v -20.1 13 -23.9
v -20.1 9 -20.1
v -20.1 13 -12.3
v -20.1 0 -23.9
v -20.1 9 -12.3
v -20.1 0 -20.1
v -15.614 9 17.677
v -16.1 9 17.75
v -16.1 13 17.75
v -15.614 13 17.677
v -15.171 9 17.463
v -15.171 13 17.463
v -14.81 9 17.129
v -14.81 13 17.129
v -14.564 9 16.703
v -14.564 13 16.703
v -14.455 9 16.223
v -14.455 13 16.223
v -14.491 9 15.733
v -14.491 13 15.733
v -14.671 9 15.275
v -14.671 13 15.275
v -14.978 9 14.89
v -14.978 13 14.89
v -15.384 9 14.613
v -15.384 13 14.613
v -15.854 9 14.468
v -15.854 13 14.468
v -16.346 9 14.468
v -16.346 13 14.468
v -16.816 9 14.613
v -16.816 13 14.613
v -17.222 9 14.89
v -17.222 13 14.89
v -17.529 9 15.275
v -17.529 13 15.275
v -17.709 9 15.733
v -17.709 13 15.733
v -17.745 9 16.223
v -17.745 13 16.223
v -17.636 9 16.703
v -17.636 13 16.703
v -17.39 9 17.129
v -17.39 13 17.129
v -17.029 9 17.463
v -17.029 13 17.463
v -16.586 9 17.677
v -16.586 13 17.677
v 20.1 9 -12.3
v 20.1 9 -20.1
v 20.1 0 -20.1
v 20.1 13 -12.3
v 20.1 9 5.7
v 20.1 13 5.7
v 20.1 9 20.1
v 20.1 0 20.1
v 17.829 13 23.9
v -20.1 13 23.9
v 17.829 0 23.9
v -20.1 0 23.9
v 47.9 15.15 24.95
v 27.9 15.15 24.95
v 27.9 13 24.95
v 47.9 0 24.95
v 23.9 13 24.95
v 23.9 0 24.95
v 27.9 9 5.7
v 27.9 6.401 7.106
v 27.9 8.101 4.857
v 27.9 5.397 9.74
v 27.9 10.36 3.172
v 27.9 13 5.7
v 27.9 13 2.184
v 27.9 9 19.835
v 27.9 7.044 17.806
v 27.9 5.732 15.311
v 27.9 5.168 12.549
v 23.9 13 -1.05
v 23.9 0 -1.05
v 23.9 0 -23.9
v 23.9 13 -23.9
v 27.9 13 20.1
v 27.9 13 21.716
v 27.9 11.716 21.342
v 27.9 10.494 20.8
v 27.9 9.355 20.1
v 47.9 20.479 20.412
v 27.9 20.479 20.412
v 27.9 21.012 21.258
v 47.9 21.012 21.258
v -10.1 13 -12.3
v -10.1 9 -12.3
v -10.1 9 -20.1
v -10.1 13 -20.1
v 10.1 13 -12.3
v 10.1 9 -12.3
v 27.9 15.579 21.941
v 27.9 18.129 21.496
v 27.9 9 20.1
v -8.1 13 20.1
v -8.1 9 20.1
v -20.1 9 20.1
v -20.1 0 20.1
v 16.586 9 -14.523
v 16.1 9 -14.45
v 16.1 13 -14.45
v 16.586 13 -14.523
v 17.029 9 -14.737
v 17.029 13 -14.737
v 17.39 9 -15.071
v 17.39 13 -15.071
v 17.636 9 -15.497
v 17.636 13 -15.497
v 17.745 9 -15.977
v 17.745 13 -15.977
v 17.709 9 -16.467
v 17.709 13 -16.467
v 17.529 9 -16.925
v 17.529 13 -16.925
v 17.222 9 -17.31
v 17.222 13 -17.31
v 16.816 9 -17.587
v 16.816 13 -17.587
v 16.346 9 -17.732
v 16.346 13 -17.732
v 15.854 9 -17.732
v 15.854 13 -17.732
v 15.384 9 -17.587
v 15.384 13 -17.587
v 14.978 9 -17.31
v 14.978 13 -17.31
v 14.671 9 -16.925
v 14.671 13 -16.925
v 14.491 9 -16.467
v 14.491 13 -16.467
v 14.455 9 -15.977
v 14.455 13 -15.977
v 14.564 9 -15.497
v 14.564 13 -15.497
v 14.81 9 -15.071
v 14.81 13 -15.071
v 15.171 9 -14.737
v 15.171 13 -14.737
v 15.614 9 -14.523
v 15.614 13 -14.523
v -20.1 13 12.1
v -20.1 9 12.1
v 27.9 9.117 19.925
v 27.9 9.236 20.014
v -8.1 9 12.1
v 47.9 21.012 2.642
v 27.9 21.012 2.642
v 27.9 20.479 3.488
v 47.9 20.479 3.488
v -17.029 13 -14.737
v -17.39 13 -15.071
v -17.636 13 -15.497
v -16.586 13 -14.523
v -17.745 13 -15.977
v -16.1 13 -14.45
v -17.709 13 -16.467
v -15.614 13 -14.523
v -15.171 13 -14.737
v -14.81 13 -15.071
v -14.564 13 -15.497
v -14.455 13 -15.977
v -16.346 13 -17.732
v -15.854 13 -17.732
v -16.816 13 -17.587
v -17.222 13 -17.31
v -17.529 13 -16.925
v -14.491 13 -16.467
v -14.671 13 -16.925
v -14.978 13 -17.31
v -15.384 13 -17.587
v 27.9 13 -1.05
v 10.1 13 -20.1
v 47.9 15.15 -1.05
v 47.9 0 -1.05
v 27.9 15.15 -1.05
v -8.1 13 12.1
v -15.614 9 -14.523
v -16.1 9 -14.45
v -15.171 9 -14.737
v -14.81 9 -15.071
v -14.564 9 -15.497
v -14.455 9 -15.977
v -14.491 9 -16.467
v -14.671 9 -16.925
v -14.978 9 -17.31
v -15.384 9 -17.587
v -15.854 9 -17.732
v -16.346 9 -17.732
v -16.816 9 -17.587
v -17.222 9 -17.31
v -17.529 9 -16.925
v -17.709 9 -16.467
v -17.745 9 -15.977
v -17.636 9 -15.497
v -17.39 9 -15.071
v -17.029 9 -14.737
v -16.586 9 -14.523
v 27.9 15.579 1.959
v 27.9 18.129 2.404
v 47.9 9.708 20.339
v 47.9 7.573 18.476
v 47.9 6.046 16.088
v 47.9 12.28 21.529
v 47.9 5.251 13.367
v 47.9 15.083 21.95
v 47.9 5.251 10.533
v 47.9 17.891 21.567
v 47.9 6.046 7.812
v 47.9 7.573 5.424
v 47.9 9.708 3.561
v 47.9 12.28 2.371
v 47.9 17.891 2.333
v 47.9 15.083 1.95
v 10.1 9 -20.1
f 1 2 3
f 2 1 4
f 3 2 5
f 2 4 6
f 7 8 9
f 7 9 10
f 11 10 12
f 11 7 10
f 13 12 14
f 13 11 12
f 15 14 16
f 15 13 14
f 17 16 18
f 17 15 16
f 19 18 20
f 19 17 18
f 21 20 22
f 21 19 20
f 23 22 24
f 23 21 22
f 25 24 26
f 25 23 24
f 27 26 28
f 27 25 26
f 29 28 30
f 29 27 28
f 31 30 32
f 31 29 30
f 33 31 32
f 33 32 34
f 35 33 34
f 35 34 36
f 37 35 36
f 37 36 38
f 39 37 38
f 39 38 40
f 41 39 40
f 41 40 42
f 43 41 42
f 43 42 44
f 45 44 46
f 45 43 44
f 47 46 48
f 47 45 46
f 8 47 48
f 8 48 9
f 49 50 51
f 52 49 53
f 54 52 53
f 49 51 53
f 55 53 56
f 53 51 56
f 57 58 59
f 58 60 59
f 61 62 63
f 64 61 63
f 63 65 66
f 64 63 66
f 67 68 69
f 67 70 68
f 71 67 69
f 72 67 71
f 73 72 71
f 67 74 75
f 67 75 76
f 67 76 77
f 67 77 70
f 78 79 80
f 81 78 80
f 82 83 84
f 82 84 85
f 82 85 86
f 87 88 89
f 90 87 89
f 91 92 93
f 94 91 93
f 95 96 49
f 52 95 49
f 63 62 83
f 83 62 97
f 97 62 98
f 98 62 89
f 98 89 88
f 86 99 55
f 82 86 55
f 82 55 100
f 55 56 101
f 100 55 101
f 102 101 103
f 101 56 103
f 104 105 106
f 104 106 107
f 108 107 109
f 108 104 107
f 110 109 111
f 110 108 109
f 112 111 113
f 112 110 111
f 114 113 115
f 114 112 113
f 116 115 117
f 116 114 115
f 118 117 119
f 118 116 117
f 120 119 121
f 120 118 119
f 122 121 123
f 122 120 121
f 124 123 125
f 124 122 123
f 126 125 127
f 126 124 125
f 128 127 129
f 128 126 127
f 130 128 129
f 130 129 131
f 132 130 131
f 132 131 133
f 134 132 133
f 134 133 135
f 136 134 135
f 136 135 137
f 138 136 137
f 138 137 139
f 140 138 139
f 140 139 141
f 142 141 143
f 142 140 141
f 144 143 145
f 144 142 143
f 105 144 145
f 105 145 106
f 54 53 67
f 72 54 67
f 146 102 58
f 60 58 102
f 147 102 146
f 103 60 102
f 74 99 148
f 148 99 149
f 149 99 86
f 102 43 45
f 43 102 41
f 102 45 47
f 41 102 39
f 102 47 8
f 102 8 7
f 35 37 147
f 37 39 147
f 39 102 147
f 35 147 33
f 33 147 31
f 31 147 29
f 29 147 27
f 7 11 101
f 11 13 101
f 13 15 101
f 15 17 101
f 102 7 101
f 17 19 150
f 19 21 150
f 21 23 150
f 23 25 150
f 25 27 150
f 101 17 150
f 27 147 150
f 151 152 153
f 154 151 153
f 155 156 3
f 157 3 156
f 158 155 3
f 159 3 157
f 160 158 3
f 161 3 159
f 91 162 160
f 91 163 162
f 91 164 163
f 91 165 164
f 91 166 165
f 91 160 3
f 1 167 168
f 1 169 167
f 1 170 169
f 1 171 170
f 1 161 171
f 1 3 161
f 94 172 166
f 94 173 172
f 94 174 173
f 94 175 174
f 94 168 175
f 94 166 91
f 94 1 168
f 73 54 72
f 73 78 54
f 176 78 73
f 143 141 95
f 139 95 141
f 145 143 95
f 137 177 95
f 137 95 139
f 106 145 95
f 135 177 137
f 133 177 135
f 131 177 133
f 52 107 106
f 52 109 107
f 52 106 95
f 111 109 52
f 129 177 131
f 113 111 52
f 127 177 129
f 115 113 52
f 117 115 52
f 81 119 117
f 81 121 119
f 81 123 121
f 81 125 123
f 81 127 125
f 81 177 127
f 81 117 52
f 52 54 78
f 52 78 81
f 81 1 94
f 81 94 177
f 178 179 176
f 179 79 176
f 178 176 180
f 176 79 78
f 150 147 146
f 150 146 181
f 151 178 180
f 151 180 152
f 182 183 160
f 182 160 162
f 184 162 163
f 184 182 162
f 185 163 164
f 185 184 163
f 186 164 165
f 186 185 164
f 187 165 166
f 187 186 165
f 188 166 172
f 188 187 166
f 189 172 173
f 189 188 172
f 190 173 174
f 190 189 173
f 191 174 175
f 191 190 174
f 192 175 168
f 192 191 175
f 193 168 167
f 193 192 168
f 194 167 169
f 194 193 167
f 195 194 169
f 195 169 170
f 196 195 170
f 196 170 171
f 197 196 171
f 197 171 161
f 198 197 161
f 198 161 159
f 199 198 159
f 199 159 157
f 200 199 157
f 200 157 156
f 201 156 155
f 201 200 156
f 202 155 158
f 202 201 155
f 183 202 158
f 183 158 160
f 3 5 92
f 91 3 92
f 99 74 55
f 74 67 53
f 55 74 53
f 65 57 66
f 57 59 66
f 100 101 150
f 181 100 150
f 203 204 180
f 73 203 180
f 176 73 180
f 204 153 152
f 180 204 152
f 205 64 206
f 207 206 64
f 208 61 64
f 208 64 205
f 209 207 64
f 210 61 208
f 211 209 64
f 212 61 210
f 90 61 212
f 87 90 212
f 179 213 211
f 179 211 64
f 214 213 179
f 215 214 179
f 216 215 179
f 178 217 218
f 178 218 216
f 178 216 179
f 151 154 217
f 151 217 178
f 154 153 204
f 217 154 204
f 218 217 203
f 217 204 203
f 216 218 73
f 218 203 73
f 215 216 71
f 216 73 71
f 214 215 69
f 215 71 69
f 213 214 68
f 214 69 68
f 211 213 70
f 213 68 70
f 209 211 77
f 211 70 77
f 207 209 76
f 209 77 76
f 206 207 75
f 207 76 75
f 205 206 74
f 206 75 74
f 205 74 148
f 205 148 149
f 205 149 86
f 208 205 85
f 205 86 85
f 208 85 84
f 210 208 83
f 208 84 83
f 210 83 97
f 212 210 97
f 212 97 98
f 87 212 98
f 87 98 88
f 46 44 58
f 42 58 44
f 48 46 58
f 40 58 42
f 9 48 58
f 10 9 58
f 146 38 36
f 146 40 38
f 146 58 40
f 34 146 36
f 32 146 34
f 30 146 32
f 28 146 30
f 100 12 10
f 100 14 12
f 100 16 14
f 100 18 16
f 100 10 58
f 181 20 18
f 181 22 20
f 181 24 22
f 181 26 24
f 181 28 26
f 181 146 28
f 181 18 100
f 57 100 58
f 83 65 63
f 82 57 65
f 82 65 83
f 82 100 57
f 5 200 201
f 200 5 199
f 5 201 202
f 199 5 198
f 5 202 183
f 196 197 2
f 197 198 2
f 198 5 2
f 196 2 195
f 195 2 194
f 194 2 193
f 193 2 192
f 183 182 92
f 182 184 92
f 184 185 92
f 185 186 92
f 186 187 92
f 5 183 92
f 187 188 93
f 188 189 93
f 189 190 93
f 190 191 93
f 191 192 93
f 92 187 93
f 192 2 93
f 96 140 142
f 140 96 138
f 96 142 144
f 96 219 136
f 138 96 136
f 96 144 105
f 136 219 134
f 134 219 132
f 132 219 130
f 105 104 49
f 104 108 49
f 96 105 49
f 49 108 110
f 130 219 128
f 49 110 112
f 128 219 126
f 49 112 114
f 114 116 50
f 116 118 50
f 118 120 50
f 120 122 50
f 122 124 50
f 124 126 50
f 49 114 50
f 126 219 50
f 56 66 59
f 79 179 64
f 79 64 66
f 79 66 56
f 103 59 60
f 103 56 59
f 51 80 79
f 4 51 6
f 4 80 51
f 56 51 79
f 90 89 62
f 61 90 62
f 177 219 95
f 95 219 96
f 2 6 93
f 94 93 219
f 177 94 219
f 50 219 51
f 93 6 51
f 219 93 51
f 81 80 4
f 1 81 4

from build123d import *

# Parameters (mm, degrees)
BOSS_EXTRUDE1_DEPTH = 9
SKETCH11_W          = 26
SKETCH11_H          = 9
BOSS_EXTRUDE2_DEPTH = 4
BOSS_EXTRUDE3_START = 4
BOSS_EXTRUDE3_DEPTH = 20
BOSS_EXTRUDE4_DEPTH = 9
SKETCH13_W          = 12
SKETCH13_H          = 8
SKETCH13_R          = 1.65
SKETCH13_H_2        = 3.8
SKETCH13_W_2        = 20.2
SKETCH13_W_3        = 4
SKETCH13_H_3        = 6.75
BOSS_EXTRUDE5_DEPTH = 4


with BuildPart() as part:
    # Sketch1 → Boss-Extrude1 (new body)
    with BuildSketch(Plane(origin=(0, 0, 0), x_dir=(1, 0, 0), z_dir=(0, 1, 0))):
        Polygon((-20.1, 20.1), (20.1, 20.1), (20.1, -20.1), (-20.1, -20.1), (-20.1, -23.9), (23.9, -23.9), (23.9, 23.9), (-20.1, 23.9), align=None)
    extrude(amount=BOSS_EXTRUDE1_DEPTH)

    # Sketch11 → Boss-Extrude2 (add)
    with BuildSketch(Plane(origin=(23.9, 0, 0), x_dir=(0, 0, -1), z_dir=(1, 0, 0))):
        with Locations((-11.95, 4.5)):
            Rectangle(SKETCH11_W, SKETCH11_H)
    extrude(amount=BOSS_EXTRUDE2_DEPTH)

    # Sketch10 → Boss-Extrude3 (add)
    with BuildSketch(Plane(origin=(23.9, 0, 0), x_dir=(0, 0, -1), z_dir=(1, 0, 0)).offset(BOSS_EXTRUDE3_START)):
        with BuildLine():
            Line((-21.257692308, 21.01232581), (-24.95, 15.15))
            Line((-24.95, 15.15), (-24.95, 0))
            Line((-24.95, 0), (1.05, 0))
            Line((1.05, 0), (1.05, 15.15))
            Line((1.05, 15.15), (-2.642307692, 21.01232581))
            Line((-2.642307692, 21.01232581), (-3.488461538, 20.4793871))
            ThreePointArc((-3.488461538, 20.4793871), (-11.95, 5.15), (-20.411538462, 20.4793871))
            Line((-20.411538462, 20.4793871), (-21.257692308, 21.01232581))
        make_face()
    extrude(amount=BOSS_EXTRUDE3_DEPTH)

    # Sketch12 → Boss-Extrude4 (add)
    with BuildSketch(Plane(origin=(0, 9, 0), x_dir=(1, 0, 0), z_dir=(0, 1, 0))):
        Polygon((23.9, -24.95), (17.829406445, -23.9), (23.9, -23.9), align=None)
    extrude(amount=-BOSS_EXTRUDE4_DEPTH)

    # Sketch13 → Boss-Extrude5 (add)
    # profile 1 of 9: a face of its own
    with BuildSketch(Plane(origin=(0, 9, 0), x_dir=(1, 0, 0), z_dir=(0, 1, 0))):
        with Locations((-14.1, -16.1)):
            Rectangle(SKETCH13_W, SKETCH13_H)
        with Locations(Location((-16.1, -16.1, 0), (0, 0, 270))):
            Circle(SKETCH13_R, mode=Mode.SUBTRACT)
    # profile 2 of 9: a face of its own
    with BuildSketch(Plane(origin=(0, 9, 0), x_dir=(1, 0, 0), z_dir=(0, 1, 0))):
        with Locations((-14.1, -22)):
            Rectangle(SKETCH13_W, SKETCH13_H_2)
    # profile 3 of 9: a face of its own
    with BuildSketch(Plane(origin=(0, 9, 0), x_dir=(1, 0, 0), z_dir=(0, 1, 0))):
        Polygon((27.9, -20.1), (-8.1, -20.1), (-8.1, -23.9), (17.829406445, -23.9), (27.9, -23.9), align=None)
    # profile 4 of 9: a face of its own
    with BuildSketch(Plane(origin=(0, 9, 0), x_dir=(1, 0, 0), z_dir=(0, 1, 0))):
        Polygon((27.9, -23.9), (17.829406445, -23.9), (23.9, -24.95), (27.9, -24.95), align=None)
    # profile 5 of 9: a face of its own
    with BuildSketch(Plane(origin=(0, 9, 0), x_dir=(1, 0, 0), z_dir=(0, 1, 0))):
        Polygon((23.9, 12.3), (23.9, 23.9), (10.1, 23.9), (10.1, 20.1), (10.1, 12.3), (20.1, 12.3), align=None)
        with Locations(Location((16.1, 16.1, 0), (0, 0, 270))):
            Circle(SKETCH13_R, mode=Mode.SUBTRACT)
    # profile 6 of 9: a face of its own
    with BuildSketch(Plane(origin=(0, 9, 0), x_dir=(1, 0, 0), z_dir=(0, 1, 0))):
        with Locations((0, 22)):
            Rectangle(SKETCH13_W_2, SKETCH13_H_2)
    # profile 7 of 9: a face of its own
    with BuildSketch(Plane(origin=(0, 9, 0), x_dir=(1, 0, 0), z_dir=(0, 1, 0))):
        Polygon((23.9, 1.05), (23.9, 12.3), (20.1, 12.3), (20.1, -5.7), (23.9, -5.7), align=None)
    # profile 8 of 9: a face of its own
    with BuildSketch(Plane(origin=(0, 9, 0), x_dir=(1, 0, 0), z_dir=(0, 1, 0))):
        Polygon((-10.1, 20.1), (-10.1, 23.9), (-20.1, 23.9), (-20.1, 12.3), (-10.1, 12.3), align=None)
        with Locations(Location((-16.1, 16.1, 0), (0, 0, 270))):
            Circle(SKETCH13_R, mode=Mode.SUBTRACT)
    # profile 9 of 9: a face of its own
    with BuildSketch(Plane(origin=(0, 9, 0), x_dir=(1, 0, 0), z_dir=(0, 1, 0))):
        with Locations((25.9, -2.325)):
            Rectangle(SKETCH13_W_3, SKETCH13_H_3)
    extrude(amount=BOSS_EXTRUDE5_DEPTH)


solid = part.part
